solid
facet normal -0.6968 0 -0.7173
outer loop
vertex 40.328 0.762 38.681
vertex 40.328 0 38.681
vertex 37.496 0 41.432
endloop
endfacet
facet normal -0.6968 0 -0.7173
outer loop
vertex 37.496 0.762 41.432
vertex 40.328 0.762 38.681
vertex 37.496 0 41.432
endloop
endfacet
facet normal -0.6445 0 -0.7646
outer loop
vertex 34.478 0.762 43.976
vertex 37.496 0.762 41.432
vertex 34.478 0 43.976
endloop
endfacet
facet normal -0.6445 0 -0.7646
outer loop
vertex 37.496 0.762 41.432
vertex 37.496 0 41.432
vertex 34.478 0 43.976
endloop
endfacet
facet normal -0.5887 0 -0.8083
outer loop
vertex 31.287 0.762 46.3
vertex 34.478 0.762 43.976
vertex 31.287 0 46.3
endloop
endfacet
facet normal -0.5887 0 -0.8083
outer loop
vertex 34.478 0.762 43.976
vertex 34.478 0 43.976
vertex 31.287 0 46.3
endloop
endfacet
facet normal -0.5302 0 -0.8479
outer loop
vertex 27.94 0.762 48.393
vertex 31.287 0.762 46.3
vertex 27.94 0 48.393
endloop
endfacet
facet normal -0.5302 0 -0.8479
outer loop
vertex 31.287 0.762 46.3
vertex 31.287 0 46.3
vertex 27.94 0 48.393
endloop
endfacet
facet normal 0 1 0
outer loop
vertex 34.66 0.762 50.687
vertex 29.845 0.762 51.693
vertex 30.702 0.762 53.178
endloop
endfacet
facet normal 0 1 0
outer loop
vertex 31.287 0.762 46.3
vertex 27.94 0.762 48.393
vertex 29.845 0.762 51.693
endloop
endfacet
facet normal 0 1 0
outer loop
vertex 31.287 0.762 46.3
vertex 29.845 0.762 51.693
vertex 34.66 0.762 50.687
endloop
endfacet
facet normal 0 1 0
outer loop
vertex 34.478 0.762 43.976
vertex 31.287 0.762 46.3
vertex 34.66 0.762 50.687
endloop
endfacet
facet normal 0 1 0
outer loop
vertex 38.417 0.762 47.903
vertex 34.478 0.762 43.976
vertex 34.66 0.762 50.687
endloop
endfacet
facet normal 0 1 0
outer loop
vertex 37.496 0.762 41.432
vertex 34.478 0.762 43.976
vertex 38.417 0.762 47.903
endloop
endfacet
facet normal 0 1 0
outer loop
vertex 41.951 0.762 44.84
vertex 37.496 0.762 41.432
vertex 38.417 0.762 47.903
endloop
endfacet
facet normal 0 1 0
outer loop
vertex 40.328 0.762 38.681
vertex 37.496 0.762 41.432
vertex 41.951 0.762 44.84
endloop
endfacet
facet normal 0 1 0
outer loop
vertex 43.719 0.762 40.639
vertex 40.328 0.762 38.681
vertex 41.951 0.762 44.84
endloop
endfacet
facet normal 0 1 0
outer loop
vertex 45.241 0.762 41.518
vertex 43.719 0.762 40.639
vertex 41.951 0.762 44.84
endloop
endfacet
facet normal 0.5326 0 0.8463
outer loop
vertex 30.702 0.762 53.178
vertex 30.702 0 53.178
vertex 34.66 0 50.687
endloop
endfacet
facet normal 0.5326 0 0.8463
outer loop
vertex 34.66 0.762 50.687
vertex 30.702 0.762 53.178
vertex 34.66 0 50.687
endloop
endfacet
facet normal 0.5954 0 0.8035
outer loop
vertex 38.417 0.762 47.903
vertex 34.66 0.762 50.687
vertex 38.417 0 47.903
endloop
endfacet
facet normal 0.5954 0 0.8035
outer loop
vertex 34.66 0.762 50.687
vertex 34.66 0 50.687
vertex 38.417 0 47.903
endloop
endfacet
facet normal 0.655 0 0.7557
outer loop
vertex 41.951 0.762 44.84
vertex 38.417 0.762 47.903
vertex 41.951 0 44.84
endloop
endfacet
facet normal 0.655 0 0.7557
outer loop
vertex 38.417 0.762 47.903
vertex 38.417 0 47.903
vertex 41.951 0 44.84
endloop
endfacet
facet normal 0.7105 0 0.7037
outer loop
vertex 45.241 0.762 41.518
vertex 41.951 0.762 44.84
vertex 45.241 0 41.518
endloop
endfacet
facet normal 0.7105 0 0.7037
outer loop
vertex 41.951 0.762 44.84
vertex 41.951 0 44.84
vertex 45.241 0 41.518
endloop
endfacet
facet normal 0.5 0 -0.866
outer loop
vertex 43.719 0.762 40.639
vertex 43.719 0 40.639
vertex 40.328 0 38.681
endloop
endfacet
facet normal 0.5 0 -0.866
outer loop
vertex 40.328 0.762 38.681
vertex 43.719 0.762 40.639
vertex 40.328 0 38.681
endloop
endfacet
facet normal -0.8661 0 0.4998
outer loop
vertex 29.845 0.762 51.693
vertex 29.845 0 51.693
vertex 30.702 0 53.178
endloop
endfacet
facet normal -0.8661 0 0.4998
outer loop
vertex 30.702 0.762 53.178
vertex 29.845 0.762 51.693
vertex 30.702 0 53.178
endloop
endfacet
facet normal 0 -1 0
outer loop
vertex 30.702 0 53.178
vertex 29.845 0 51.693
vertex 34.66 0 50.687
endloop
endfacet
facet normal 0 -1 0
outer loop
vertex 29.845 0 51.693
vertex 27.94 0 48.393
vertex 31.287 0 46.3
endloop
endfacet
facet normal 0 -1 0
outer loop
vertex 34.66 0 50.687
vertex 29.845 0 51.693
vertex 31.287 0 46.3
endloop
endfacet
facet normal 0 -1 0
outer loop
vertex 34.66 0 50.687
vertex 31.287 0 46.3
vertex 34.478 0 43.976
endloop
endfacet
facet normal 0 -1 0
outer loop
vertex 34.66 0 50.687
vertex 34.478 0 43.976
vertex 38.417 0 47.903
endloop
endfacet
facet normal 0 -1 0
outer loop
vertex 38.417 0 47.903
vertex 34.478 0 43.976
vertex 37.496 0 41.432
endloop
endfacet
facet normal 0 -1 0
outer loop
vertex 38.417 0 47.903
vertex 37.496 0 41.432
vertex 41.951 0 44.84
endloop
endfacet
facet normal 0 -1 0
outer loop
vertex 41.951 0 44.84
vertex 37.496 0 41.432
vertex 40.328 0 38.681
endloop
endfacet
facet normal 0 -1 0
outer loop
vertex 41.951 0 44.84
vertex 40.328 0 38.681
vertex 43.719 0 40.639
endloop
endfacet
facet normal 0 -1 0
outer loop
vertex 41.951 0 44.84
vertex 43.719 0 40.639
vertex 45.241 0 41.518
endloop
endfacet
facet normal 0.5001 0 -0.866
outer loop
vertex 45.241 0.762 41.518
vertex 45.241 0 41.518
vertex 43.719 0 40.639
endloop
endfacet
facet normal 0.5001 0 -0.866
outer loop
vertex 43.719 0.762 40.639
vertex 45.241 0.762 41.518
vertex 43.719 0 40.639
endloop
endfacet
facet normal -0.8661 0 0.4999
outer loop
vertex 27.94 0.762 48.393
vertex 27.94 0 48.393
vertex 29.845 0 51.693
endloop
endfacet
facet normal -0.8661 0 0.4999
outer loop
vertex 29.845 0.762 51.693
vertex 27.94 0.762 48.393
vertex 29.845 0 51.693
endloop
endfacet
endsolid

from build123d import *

# Parameters (mm, degrees)
BOSS_EXTRUDE1_DEPTH = 0.762


with BuildPart() as part:
    # Sketch1 → Boss-Extrude1 (new body)
    with BuildSketch(Plane(origin=(0, 0, 0), x_dir=(1, 0, 0), z_dir=(0, 1, 0))):
        with BuildLine():
            ThreePointArc((40.32786287, -38.681234163), (34.47763478, -43.975755821), (27.94, -48.393499563))
            Line((27.94, -48.393499563), (29.845, -51.693056352))
            ThreePointArc((29.845, -51.693056352), (37.194959, -46.68437774), (43.719059778, -40.639142611))
            Line((43.719059778, -40.639142611), (40.32786287, -38.681234163))
        make_face()
        with BuildLine():
            ThreePointArc((43.719059778, -40.639142611), (37.194959, -46.68437774), (29.845, -51.693056352))
            Line((29.845, -51.693056352), (30.70225, -53.177856907))
            ThreePointArc((30.70225, -53.177856907), (38.416686562, -47.902722406), (45.241244894, -41.517976597))
            Line((45.241244894, -41.517976597), (43.719059778, -40.639142611))
        make_face()
    extrude(amount=BOSS_EXTRUDE1_DEPTH)


solid = part.part
